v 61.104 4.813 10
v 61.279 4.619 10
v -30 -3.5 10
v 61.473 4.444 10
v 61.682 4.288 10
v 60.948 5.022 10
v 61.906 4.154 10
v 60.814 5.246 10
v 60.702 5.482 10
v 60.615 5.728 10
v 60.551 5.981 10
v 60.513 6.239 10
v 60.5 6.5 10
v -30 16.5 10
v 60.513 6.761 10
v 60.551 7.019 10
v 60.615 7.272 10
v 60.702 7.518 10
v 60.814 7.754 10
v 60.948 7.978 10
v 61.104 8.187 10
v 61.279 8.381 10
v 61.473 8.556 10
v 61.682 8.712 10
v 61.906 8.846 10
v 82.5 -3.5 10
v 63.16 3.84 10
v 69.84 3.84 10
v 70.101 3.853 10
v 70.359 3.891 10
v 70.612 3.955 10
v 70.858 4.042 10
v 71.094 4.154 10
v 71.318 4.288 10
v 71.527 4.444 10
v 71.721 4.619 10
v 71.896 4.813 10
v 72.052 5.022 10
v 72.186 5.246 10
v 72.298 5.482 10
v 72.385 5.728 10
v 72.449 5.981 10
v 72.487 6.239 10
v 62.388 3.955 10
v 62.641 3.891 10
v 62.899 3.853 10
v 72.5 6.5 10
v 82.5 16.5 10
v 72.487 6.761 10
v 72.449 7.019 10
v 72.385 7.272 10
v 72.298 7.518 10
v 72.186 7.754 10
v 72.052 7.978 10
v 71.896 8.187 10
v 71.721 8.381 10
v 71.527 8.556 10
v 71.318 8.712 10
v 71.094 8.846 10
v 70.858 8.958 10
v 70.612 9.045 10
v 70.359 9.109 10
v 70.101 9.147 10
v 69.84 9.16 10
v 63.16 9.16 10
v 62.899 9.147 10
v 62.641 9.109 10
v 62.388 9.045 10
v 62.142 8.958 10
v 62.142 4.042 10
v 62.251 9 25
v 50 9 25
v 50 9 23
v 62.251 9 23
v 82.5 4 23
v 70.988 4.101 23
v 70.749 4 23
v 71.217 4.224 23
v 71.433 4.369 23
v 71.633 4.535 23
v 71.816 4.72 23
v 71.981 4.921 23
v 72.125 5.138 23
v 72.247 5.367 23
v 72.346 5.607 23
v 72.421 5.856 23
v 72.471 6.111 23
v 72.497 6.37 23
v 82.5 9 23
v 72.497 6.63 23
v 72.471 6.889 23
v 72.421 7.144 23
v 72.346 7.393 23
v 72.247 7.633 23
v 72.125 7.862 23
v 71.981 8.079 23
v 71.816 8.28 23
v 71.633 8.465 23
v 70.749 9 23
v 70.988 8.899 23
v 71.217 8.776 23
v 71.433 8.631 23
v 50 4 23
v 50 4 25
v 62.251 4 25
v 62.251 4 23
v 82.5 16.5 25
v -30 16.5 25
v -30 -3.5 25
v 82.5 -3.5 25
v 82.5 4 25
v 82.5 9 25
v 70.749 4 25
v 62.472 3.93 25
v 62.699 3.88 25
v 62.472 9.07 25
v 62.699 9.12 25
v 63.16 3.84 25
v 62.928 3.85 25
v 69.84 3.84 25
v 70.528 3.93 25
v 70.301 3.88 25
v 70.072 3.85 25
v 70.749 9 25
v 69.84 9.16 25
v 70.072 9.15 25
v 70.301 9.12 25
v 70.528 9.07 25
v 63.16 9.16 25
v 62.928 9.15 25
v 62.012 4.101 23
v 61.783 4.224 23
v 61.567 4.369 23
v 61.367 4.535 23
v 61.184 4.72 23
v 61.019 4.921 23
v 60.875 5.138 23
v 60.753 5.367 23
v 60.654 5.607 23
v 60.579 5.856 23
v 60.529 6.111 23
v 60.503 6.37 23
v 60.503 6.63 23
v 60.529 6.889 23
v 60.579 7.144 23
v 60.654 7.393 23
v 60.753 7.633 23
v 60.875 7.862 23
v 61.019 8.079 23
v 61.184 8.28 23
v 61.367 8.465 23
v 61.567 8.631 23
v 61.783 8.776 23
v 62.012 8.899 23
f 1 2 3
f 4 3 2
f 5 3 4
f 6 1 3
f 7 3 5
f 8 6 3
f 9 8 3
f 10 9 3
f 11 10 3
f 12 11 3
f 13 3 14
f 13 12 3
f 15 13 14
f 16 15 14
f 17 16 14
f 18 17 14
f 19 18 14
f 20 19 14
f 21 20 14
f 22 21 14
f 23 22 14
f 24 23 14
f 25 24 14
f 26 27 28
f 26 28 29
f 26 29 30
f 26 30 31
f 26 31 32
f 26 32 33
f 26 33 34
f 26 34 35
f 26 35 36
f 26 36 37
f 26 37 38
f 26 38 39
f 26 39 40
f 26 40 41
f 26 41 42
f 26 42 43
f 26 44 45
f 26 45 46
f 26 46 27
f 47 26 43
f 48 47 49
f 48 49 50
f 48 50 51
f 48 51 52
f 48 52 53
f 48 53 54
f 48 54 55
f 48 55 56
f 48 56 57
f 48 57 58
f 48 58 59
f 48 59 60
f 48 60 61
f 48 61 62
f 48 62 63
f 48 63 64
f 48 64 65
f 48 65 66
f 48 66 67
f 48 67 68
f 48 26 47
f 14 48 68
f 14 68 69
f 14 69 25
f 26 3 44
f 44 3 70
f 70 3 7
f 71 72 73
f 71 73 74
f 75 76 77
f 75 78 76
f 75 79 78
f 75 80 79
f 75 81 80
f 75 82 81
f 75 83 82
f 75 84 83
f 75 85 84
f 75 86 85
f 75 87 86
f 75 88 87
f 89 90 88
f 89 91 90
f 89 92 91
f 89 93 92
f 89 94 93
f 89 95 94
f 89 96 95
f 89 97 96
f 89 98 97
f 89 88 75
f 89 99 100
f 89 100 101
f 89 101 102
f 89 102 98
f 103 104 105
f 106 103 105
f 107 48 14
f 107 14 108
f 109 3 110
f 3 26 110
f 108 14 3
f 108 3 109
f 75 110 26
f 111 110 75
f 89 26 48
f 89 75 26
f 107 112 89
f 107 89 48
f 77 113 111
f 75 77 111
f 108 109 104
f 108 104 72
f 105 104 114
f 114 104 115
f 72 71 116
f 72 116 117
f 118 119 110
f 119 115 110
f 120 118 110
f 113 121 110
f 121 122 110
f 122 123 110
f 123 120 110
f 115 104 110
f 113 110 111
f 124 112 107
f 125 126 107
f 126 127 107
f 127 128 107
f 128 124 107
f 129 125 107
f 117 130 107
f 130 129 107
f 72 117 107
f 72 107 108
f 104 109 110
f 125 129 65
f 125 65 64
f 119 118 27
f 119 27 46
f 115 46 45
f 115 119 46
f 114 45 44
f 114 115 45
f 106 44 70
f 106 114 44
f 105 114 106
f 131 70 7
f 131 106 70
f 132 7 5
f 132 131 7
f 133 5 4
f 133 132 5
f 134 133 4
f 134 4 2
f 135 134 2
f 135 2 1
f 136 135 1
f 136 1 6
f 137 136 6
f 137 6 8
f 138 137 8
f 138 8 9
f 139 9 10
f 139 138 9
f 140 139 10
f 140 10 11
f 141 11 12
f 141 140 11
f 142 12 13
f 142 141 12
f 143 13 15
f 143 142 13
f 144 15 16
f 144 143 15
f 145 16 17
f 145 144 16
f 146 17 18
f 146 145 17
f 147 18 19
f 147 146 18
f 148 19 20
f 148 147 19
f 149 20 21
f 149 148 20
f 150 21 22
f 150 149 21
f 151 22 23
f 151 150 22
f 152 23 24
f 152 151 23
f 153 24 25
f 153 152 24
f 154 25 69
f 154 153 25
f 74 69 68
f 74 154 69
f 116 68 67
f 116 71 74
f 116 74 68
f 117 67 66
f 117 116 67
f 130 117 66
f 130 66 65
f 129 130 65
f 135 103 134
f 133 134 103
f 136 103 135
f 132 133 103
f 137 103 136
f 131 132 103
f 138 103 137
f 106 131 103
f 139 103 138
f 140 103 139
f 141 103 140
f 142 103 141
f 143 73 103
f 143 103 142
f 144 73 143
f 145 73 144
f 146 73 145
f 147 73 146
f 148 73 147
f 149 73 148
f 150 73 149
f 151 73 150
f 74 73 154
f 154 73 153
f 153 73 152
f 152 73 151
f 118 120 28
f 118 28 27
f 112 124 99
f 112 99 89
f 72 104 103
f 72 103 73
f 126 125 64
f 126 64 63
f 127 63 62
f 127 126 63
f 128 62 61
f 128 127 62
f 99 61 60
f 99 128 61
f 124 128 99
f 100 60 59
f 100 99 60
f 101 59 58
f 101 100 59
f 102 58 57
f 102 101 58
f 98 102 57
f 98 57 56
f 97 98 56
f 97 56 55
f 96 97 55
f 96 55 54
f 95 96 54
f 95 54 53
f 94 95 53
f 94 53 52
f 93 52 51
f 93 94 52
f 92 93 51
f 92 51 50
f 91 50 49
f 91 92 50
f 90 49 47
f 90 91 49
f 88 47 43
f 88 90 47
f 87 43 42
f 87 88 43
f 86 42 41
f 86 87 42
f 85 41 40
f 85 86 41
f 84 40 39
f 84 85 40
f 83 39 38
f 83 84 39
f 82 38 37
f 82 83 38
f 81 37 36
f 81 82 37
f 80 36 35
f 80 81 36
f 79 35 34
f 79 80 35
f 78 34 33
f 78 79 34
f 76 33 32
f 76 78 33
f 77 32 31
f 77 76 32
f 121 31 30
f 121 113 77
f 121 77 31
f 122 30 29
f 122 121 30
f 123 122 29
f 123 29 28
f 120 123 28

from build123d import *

# Parameters (mm, degrees)
SKETCH1_W           = 24.634
SKETCH1_H           = 13
BOSS_EXTRUDE1_DEPTH = 10
SKETCH4_W           = 82.5
SKETCH4_H           = 13
BOSS_EXTRUDE4_DEPTH = 15
SKETCH5_W           = 28
SKETCH5_H           = 3.5
BOSS_EXTRUDE5_DEPTH = 15
CUT_EXTRUDE1_DEPTH  = 26
SKETCH7_W           = 32.5
SKETCH7_H           = 5
CUT_EXTRUDE2_DEPTH  = 2
SKETCH8_W           = 10
SKETCH8_H           = 13
CUT_EXTRUDE3_DEPTH  = 25.634
SKETCH9_W           = 15
SKETCH9_H           = 3.5
BOSS_EXTRUDE6_DEPTH = 54.5
SKETCH10_W          = 15
SKETCH10_H          = 20
BOSS_EXTRUDE7_DEPTH = 30


with BuildPart() as part:
    # Sketch1 → Boss-Extrude1 (new body)
    with BuildSketch(Plane.XY):
        with Locations((12.317, 6.5)):
            Rectangle(SKETCH1_W, SKETCH1_H)
    extrude(amount=BOSS_EXTRUDE1_DEPTH)

    # Sketch4 → Boss-Extrude4 (add)
    with BuildSketch(Plane.XY.offset(10)):
        with Locations((41.25, 6.5)):
            Rectangle(SKETCH4_W, SKETCH4_H)
    extrude(amount=BOSS_EXTRUDE4_DEPTH)

    # Sketch5 → Boss-Extrude5 (add)
    with BuildSketch(Plane.XY.offset(25)):
        with Locations((68.5, -1.75)):
            Rectangle(SKETCH5_W, SKETCH5_H)
        with Locations((68.5, 14.75)):
            Rectangle(SKETCH5_W, SKETCH5_H)
    extrude(amount=-BOSS_EXTRUDE5_DEPTH)

    # Sketch6 → Cut-Extrude1 (cut, through all)
    with BuildSketch(Plane.XY.offset(25)):
        with BuildLine():
            Line((63.16, 9.16), (69.84, 9.16))
            ThreePointArc((69.84, 9.16), (72.5, 6.5), (69.84, 3.84))
            Line((69.84, 3.84), (63.16, 3.84))
            ThreePointArc((63.16, 3.84), (60.5, 6.5), (63.16, 9.16))
        make_face()
    extrude(amount=-CUT_EXTRUDE1_DEPTH, mode=Mode.SUBTRACT)

    # Sketch7 → Cut-Extrude2 (cut)
    with BuildSketch(Plane.XY.offset(25)):
        with Locations((66.25, 6.5)):
            Rectangle(SKETCH7_W, SKETCH7_H)
    extrude(amount=-CUT_EXTRUDE2_DEPTH, mode=Mode.SUBTRACT)

    # Sketch8 → Cut-Extrude3 (cut, through all)
    with BuildSketch(Plane(origin=(24.634, 0, 0), x_dir=(0, 0, -1), z_dir=(1, 0, 0))):
        with Locations((-5, 6.5)):
            Rectangle(SKETCH8_W, SKETCH8_H)
    extrude(amount=-CUT_EXTRUDE3_DEPTH, mode=Mode.SUBTRACT)

    # Sketch9 → Boss-Extrude6 (add)
    with BuildSketch(Plane.ZY.offset(-54.5)):
        with Locations((17.5, 14.75)):
            Rectangle(SKETCH9_W, SKETCH9_H)
        with Locations((17.5, -1.75)):
            Rectangle(SKETCH9_W, SKETCH9_H)
    extrude(amount=BOSS_EXTRUDE6_DEPTH)

    # Sketch10 → Boss-Extrude7 (add)
    with BuildSketch(Plane.ZY):
        with Locations((17.5, 6.5)):
            Rectangle(SKETCH10_W, SKETCH10_H)
    extrude(amount=BOSS_EXTRUDE7_DEPTH)


solid = part.part
